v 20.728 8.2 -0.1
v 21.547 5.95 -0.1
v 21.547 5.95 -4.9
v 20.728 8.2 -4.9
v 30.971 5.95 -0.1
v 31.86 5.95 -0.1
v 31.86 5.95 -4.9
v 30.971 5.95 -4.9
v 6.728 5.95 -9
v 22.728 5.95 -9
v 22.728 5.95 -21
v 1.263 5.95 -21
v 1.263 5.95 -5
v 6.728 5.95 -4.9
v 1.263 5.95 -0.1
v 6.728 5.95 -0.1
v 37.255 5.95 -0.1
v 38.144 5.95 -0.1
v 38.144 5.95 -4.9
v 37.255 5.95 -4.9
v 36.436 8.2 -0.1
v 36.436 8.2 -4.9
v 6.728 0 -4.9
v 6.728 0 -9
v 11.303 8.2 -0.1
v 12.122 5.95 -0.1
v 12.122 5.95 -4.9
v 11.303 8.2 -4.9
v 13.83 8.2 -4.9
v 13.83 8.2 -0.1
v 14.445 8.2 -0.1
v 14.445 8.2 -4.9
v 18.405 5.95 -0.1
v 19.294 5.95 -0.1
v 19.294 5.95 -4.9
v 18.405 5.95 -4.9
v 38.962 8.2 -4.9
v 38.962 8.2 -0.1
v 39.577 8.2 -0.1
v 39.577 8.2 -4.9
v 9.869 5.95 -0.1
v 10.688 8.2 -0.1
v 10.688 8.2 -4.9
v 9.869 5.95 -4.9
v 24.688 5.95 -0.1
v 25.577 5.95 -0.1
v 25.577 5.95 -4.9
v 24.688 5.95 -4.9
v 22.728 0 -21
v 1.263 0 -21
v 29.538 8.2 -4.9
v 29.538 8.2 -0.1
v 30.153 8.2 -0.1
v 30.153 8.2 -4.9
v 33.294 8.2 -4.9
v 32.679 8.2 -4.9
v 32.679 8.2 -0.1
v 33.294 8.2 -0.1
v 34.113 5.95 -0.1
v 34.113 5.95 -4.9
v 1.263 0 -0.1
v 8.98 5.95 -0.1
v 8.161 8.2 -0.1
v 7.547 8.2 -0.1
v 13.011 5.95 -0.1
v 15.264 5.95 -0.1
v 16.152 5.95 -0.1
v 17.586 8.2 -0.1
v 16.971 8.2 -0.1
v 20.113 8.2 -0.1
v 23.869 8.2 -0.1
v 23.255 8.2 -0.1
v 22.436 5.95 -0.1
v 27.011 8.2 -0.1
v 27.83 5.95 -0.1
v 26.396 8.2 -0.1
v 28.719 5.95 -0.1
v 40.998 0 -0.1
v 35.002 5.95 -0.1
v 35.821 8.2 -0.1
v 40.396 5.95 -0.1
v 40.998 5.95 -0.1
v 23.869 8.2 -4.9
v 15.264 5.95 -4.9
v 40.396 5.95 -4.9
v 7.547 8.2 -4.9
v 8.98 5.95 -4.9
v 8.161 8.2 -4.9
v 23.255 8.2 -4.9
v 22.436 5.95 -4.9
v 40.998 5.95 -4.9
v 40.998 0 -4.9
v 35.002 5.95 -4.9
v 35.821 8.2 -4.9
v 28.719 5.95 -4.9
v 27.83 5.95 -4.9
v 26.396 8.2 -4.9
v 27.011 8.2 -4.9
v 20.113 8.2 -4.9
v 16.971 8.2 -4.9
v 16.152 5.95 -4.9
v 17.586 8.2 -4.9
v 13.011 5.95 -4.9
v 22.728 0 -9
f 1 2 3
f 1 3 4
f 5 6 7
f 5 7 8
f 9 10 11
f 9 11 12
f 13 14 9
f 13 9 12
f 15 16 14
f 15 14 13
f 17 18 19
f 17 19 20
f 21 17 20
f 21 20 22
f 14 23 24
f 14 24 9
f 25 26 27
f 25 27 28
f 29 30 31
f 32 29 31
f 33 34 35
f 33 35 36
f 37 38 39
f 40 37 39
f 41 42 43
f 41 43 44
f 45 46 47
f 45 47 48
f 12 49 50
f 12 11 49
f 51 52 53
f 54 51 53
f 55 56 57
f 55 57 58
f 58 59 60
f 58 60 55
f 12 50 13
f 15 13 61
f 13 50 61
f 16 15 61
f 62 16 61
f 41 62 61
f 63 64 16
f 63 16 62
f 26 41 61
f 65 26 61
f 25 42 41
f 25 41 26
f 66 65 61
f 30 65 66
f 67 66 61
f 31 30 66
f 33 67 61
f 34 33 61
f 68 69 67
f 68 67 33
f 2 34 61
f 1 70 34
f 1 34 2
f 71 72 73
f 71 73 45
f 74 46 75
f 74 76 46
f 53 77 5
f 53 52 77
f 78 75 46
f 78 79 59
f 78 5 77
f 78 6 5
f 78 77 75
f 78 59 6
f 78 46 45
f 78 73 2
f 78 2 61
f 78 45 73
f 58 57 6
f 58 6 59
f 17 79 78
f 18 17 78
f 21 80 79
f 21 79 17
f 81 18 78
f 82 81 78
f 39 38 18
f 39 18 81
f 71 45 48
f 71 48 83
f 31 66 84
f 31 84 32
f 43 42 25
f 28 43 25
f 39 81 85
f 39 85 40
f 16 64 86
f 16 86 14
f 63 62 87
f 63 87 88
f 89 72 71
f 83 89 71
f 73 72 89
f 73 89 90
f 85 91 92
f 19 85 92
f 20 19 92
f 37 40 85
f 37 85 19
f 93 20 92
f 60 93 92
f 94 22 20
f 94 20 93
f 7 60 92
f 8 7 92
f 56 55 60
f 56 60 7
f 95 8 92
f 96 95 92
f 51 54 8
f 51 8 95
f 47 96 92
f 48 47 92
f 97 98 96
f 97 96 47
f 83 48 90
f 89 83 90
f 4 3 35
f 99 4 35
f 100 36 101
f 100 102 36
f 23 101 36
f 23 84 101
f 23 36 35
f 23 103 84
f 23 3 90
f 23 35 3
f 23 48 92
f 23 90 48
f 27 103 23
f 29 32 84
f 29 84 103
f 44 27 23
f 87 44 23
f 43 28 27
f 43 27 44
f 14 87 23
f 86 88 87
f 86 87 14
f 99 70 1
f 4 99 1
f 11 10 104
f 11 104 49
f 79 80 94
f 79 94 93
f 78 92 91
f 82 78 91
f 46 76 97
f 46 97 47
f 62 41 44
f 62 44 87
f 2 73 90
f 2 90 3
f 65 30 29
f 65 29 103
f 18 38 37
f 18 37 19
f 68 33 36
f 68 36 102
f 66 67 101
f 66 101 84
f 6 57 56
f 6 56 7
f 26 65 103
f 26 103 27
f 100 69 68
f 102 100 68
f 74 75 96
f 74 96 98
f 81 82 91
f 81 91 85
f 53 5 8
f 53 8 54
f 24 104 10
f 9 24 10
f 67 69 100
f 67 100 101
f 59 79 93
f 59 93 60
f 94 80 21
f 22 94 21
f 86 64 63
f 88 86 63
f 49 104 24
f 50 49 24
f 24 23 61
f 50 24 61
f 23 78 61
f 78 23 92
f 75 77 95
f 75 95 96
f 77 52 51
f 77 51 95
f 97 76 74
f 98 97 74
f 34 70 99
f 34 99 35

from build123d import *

# Parameters (mm, degrees)
BLANKSKE_W          = 53
BLANKSKE_H          = 8.2
BLANK_DEPTH         = 5
TOOTHCUTSIM_DEPTH   = 54.863159952
TEETHCUTS_COUNT     = 18
TEETHCUTS_PITCH     = 3.14159265
SKETCH2_W           = 6.72762067
SKETCH2_H           = 5.95
BOSS_EXTRUDE1_DEPTH = 20
SKETCH3_W           = 12
SKETCH3_H           = 5.95
BOSS_EXTRUDE2_DEPTH = 16
SKETCH4_W           = 6.72762067
SKETCH4_H           = 5.95
CUT_EXTRUDE1_DEPTH  = 4
SKETCH7_W           = 12.002
SKETCH7_H           = 8.2
CUT_EXTRUDE3_DEPTH  = 9.55
SKETCH9_W           = 1.263
SKETCH9_H           = 21
CUT_EXTRUDE4_DEPTH  = 9.55
SKETCH10_W          = 4.57574993
SKETCH10_H          = 2.726704985
CUT_EXTRUDE6_DEPTH  = 9.55
BLANKSKE_2_W        = 53
BLANKSKE_2_H        = 8.2
CUT_EXTRUDE7_DEPTH  = 0.1
SKETCH11_W          = 34.27037933
SKETCH11_H          = 11.830057098
CUT_EXTRUDE8_DEPTH  = 0.1


with BuildPart() as part:
    # BlankSke → Blank (new body)
    with BuildSketch(Plane.XY):
        with Locations((26.5, 4.1)):
            Rectangle(BLANKSKE_W, BLANKSKE_H)
    extrude(amount=-BLANK_DEPTH)

    # TooCutSkeSim → ToothCutSim (cut, through all)
    with BuildSketch(Plane.XY):
        Polygon((0.44443537, 5.95), (-0.44443537, 5.95), (-1.272613241, 8.2254), (1.272613241, 8.2254), align=None)
    toothcutsim = extrude(amount=-TOOTHCUTSIM_DEPTH, mode=Mode.SUBTRACT)

    # TeethCuts: ToothCutSim ×18
    with Locations(*[(i * TEETHCUTS_PITCH, 0, 0) for i in range(1, TEETHCUTS_COUNT)]):
        add(toothcutsim, mode=Mode.SUBTRACT)

    # Sketch2 → Boss-Extrude1 (add)
    with BuildSketch(Plane(origin=(0, 0, -5), x_dir=(-1, 0, 0), z_dir=(0, 0, -1))):
        with Locations((-3.363810335, 2.975)):
            Rectangle(SKETCH2_W, SKETCH2_H)
    extrude(amount=BOSS_EXTRUDE1_DEPTH)

    # Sketch3 → Boss-Extrude2 (add)
    with BuildSketch(Plane(origin=(6.72762067, 0, 0), x_dir=(0, 0, -1), z_dir=(1, 0, 0))):
        with Locations((15, 2.975)):
            Rectangle(SKETCH3_W, SKETCH3_H)
    extrude(amount=BOSS_EXTRUDE2_DEPTH)

    # Sketch4 → Cut-Extrude1 (cut)
    with BuildSketch(Plane(origin=(0, 0, -25), x_dir=(-1, 0, 0), z_dir=(0, 0, -1))):
        with Locations((-3.363810335, 2.975)):
            Rectangle(SKETCH4_W, SKETCH4_H)
    extrude(amount=-CUT_EXTRUDE1_DEPTH, mode=Mode.SUBTRACT)

    # Sketch7 → Cut-Extrude3 (cut)
    with BuildSketch(Plane(origin=(0, 0, -5), x_dir=(-1, 0, 0), z_dir=(0, 0, -1))):
        with Locations((-46.999, 4.1)):
            Rectangle(SKETCH7_W, SKETCH7_H)
    extrude(amount=-CUT_EXTRUDE3_DEPTH, mode=Mode.SUBTRACT)

    # Sketch9 → Cut-Extrude4 (cut)
    with BuildSketch(Plane.XZ):
        with Locations((0.6315, -10.5)):
            Rectangle(SKETCH9_W, SKETCH9_H)
    extrude(amount=-CUT_EXTRUDE4_DEPTH, mode=Mode.SUBTRACT)

    # Sketch10 → Cut-Extrude6 (cut)
    with BuildSketch(Plane.XY):
        with Locations((3.550874965, 7.313352492)):
            Rectangle(SKETCH10_W, SKETCH10_H)
    extrude(amount=-CUT_EXTRUDE6_DEPTH, mode=Mode.SUBTRACT)

    # BlankSke<2> → Cut-Extrude7 (cut)
    with BuildSketch(Plane.XY):
        with Locations((26.5, 4.1)):
            Rectangle(BLANKSKE_2_W, BLANKSKE_2_H)
    extrude(amount=-CUT_EXTRUDE7_DEPTH, mode=Mode.SUBTRACT)

    # Sketch11 → Cut-Extrude8 (cut)
    with BuildSketch(Plane(origin=(0, 0, -5), x_dir=(-1, 0, 0), z_dir=(0, 0, -1))):
        with Locations((-23.862810335, 5.915028549)):
            Rectangle(SKETCH11_W, SKETCH11_H)
    extrude(amount=-CUT_EXTRUDE8_DEPTH, mode=Mode.SUBTRACT)


solid = part.part
